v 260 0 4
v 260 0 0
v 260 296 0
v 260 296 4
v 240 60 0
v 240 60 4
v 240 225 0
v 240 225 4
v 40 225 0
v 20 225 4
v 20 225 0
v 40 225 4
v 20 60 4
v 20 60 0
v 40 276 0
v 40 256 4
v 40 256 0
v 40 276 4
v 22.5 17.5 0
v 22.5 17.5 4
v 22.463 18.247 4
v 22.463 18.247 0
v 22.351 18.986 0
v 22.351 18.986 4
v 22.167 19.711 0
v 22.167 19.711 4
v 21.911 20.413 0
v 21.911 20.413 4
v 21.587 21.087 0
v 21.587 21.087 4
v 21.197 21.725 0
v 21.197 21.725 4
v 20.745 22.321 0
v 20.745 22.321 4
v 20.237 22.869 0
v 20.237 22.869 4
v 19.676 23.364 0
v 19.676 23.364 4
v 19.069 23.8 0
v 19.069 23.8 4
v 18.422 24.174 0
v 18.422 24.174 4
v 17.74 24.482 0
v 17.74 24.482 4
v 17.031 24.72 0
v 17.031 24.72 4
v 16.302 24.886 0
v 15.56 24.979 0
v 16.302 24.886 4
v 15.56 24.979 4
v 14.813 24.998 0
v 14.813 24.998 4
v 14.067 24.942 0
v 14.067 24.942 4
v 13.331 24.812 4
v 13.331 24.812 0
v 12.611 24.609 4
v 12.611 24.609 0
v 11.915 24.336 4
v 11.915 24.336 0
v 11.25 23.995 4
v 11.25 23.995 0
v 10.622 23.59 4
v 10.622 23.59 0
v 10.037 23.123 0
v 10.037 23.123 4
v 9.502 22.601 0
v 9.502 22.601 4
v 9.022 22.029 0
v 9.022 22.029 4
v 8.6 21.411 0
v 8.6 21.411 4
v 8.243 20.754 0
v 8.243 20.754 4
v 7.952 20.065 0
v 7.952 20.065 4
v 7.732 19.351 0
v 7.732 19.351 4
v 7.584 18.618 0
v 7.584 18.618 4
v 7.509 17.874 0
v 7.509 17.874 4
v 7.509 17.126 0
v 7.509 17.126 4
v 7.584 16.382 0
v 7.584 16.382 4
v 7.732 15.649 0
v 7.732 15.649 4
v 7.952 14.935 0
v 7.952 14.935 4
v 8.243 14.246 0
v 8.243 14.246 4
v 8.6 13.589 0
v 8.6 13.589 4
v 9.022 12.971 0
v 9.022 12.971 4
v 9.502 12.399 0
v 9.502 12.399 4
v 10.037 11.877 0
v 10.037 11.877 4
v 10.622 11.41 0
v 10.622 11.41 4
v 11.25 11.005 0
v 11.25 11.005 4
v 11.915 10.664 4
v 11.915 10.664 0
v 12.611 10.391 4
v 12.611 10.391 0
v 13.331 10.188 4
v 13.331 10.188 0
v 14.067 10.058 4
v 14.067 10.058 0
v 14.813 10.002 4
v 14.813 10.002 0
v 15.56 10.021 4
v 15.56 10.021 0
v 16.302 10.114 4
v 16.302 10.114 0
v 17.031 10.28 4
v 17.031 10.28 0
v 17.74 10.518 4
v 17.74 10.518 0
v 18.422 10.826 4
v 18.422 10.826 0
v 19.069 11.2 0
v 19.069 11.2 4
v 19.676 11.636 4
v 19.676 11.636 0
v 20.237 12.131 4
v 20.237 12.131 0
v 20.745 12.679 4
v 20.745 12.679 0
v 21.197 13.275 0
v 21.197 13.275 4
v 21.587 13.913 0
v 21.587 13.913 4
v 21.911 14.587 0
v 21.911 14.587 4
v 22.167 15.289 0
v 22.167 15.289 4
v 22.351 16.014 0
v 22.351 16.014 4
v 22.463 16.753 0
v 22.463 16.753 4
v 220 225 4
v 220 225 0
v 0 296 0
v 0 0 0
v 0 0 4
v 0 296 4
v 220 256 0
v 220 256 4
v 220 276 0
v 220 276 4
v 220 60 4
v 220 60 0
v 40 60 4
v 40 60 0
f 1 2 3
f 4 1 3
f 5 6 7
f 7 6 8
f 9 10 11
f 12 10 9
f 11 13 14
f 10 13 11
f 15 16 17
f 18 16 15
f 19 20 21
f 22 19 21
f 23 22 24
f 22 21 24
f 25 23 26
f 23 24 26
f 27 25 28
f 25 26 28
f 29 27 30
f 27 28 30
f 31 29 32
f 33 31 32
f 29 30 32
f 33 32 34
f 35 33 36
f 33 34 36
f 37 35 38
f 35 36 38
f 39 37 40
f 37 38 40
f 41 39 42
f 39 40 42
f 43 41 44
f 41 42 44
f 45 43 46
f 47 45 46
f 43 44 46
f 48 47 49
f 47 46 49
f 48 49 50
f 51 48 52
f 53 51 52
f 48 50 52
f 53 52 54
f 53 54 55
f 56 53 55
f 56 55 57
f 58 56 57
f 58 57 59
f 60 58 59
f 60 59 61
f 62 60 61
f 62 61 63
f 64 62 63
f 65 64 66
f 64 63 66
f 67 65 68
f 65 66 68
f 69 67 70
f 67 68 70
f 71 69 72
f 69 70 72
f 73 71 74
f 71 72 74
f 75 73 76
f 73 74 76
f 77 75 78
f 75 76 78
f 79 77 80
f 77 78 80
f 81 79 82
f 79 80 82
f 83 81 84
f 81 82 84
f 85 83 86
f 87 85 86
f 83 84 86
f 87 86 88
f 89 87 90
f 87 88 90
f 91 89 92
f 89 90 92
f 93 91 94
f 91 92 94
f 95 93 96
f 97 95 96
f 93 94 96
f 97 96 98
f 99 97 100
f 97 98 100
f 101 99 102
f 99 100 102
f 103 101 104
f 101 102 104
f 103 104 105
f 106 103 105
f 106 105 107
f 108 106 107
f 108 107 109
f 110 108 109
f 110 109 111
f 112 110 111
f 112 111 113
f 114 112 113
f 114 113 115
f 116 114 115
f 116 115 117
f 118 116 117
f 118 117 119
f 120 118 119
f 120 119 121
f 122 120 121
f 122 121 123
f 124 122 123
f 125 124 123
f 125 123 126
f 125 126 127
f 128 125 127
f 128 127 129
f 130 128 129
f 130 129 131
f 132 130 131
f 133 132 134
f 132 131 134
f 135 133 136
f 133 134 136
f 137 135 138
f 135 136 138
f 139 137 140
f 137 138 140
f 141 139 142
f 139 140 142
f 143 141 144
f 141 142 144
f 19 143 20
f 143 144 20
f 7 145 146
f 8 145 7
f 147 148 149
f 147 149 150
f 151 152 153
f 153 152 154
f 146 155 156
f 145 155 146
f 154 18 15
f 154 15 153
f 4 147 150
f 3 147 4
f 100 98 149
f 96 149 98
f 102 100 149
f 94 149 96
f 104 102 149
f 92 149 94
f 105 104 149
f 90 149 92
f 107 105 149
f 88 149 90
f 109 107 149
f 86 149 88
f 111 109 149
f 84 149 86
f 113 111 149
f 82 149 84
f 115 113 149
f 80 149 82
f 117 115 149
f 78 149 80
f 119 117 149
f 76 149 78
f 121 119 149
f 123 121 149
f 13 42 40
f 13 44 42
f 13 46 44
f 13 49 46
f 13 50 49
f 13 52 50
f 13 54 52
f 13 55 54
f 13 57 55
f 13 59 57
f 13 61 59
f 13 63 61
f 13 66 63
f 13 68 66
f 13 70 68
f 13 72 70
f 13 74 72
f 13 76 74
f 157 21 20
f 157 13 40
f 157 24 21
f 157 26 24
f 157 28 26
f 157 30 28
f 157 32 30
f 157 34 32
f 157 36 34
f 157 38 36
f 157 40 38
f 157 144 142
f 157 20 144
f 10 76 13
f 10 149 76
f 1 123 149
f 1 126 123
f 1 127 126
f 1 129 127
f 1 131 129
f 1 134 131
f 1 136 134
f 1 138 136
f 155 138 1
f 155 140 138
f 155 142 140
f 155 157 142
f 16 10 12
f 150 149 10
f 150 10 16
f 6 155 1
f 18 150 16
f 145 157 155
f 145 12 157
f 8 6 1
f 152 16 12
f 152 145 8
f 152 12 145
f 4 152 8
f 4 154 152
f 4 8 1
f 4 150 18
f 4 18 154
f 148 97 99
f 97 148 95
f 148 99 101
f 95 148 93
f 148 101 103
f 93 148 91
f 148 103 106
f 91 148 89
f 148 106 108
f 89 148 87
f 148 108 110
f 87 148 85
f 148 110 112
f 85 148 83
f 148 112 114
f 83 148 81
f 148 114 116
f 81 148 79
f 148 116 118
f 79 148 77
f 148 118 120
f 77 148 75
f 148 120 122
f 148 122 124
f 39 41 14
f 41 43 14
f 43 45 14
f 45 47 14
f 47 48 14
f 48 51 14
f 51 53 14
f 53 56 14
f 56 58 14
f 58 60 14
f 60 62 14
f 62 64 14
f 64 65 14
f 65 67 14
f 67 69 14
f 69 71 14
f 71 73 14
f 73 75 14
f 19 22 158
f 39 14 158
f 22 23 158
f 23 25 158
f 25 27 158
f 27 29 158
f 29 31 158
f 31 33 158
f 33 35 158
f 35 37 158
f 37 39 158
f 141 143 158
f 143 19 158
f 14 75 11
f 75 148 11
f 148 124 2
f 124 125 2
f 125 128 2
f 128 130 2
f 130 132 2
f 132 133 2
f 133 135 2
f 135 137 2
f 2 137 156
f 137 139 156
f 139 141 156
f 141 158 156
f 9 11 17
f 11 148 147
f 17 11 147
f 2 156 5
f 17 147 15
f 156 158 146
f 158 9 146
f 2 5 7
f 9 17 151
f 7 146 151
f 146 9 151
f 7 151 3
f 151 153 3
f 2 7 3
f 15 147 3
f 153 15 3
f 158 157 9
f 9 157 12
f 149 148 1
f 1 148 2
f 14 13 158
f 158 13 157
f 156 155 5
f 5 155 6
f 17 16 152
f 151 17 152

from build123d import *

# Parameters (mm, degrees)
CROQUIS1_W              = 260
CROQUIS1_H              = 296
SALIENTE_EXTRUIR1_DEPTH = 4
CROQUIS2_R              = 7.5
CROQUIS2_W              = 20
CROQUIS2_H              = 165
CROQUIS2_W_2            = 180
CROQUIS2_H_2            = 20
CORTAR_EXTRUIR1_DEPTH   = 4


with BuildPart() as part:
    # Croquis1 → Saliente-Extruir1 (new body)
    with BuildSketch(Plane.XY):
        with Locations((130, 148)):
            Rectangle(CROQUIS1_W, CROQUIS1_H)
    extrude(amount=SALIENTE_EXTRUIR1_DEPTH)

    # Croquis2 → Cortar-Extruir1 (cut)
    with BuildSketch(Plane.XY.offset(4)):
        with Locations((15, 17.5)):
            Circle(CROQUIS2_R)
        with Locations((30, 142.5)):
            Rectangle(CROQUIS2_W, CROQUIS2_H)
        with Locations((230, 142.5)):
            Rectangle(CROQUIS2_W, CROQUIS2_H)
        with Locations((130, 266)):
            Rectangle(CROQUIS2_W_2, CROQUIS2_H_2)
    extrude(amount=-CORTAR_EXTRUIR1_DEPTH, mode=Mode.SUBTRACT)


solid = part.part
